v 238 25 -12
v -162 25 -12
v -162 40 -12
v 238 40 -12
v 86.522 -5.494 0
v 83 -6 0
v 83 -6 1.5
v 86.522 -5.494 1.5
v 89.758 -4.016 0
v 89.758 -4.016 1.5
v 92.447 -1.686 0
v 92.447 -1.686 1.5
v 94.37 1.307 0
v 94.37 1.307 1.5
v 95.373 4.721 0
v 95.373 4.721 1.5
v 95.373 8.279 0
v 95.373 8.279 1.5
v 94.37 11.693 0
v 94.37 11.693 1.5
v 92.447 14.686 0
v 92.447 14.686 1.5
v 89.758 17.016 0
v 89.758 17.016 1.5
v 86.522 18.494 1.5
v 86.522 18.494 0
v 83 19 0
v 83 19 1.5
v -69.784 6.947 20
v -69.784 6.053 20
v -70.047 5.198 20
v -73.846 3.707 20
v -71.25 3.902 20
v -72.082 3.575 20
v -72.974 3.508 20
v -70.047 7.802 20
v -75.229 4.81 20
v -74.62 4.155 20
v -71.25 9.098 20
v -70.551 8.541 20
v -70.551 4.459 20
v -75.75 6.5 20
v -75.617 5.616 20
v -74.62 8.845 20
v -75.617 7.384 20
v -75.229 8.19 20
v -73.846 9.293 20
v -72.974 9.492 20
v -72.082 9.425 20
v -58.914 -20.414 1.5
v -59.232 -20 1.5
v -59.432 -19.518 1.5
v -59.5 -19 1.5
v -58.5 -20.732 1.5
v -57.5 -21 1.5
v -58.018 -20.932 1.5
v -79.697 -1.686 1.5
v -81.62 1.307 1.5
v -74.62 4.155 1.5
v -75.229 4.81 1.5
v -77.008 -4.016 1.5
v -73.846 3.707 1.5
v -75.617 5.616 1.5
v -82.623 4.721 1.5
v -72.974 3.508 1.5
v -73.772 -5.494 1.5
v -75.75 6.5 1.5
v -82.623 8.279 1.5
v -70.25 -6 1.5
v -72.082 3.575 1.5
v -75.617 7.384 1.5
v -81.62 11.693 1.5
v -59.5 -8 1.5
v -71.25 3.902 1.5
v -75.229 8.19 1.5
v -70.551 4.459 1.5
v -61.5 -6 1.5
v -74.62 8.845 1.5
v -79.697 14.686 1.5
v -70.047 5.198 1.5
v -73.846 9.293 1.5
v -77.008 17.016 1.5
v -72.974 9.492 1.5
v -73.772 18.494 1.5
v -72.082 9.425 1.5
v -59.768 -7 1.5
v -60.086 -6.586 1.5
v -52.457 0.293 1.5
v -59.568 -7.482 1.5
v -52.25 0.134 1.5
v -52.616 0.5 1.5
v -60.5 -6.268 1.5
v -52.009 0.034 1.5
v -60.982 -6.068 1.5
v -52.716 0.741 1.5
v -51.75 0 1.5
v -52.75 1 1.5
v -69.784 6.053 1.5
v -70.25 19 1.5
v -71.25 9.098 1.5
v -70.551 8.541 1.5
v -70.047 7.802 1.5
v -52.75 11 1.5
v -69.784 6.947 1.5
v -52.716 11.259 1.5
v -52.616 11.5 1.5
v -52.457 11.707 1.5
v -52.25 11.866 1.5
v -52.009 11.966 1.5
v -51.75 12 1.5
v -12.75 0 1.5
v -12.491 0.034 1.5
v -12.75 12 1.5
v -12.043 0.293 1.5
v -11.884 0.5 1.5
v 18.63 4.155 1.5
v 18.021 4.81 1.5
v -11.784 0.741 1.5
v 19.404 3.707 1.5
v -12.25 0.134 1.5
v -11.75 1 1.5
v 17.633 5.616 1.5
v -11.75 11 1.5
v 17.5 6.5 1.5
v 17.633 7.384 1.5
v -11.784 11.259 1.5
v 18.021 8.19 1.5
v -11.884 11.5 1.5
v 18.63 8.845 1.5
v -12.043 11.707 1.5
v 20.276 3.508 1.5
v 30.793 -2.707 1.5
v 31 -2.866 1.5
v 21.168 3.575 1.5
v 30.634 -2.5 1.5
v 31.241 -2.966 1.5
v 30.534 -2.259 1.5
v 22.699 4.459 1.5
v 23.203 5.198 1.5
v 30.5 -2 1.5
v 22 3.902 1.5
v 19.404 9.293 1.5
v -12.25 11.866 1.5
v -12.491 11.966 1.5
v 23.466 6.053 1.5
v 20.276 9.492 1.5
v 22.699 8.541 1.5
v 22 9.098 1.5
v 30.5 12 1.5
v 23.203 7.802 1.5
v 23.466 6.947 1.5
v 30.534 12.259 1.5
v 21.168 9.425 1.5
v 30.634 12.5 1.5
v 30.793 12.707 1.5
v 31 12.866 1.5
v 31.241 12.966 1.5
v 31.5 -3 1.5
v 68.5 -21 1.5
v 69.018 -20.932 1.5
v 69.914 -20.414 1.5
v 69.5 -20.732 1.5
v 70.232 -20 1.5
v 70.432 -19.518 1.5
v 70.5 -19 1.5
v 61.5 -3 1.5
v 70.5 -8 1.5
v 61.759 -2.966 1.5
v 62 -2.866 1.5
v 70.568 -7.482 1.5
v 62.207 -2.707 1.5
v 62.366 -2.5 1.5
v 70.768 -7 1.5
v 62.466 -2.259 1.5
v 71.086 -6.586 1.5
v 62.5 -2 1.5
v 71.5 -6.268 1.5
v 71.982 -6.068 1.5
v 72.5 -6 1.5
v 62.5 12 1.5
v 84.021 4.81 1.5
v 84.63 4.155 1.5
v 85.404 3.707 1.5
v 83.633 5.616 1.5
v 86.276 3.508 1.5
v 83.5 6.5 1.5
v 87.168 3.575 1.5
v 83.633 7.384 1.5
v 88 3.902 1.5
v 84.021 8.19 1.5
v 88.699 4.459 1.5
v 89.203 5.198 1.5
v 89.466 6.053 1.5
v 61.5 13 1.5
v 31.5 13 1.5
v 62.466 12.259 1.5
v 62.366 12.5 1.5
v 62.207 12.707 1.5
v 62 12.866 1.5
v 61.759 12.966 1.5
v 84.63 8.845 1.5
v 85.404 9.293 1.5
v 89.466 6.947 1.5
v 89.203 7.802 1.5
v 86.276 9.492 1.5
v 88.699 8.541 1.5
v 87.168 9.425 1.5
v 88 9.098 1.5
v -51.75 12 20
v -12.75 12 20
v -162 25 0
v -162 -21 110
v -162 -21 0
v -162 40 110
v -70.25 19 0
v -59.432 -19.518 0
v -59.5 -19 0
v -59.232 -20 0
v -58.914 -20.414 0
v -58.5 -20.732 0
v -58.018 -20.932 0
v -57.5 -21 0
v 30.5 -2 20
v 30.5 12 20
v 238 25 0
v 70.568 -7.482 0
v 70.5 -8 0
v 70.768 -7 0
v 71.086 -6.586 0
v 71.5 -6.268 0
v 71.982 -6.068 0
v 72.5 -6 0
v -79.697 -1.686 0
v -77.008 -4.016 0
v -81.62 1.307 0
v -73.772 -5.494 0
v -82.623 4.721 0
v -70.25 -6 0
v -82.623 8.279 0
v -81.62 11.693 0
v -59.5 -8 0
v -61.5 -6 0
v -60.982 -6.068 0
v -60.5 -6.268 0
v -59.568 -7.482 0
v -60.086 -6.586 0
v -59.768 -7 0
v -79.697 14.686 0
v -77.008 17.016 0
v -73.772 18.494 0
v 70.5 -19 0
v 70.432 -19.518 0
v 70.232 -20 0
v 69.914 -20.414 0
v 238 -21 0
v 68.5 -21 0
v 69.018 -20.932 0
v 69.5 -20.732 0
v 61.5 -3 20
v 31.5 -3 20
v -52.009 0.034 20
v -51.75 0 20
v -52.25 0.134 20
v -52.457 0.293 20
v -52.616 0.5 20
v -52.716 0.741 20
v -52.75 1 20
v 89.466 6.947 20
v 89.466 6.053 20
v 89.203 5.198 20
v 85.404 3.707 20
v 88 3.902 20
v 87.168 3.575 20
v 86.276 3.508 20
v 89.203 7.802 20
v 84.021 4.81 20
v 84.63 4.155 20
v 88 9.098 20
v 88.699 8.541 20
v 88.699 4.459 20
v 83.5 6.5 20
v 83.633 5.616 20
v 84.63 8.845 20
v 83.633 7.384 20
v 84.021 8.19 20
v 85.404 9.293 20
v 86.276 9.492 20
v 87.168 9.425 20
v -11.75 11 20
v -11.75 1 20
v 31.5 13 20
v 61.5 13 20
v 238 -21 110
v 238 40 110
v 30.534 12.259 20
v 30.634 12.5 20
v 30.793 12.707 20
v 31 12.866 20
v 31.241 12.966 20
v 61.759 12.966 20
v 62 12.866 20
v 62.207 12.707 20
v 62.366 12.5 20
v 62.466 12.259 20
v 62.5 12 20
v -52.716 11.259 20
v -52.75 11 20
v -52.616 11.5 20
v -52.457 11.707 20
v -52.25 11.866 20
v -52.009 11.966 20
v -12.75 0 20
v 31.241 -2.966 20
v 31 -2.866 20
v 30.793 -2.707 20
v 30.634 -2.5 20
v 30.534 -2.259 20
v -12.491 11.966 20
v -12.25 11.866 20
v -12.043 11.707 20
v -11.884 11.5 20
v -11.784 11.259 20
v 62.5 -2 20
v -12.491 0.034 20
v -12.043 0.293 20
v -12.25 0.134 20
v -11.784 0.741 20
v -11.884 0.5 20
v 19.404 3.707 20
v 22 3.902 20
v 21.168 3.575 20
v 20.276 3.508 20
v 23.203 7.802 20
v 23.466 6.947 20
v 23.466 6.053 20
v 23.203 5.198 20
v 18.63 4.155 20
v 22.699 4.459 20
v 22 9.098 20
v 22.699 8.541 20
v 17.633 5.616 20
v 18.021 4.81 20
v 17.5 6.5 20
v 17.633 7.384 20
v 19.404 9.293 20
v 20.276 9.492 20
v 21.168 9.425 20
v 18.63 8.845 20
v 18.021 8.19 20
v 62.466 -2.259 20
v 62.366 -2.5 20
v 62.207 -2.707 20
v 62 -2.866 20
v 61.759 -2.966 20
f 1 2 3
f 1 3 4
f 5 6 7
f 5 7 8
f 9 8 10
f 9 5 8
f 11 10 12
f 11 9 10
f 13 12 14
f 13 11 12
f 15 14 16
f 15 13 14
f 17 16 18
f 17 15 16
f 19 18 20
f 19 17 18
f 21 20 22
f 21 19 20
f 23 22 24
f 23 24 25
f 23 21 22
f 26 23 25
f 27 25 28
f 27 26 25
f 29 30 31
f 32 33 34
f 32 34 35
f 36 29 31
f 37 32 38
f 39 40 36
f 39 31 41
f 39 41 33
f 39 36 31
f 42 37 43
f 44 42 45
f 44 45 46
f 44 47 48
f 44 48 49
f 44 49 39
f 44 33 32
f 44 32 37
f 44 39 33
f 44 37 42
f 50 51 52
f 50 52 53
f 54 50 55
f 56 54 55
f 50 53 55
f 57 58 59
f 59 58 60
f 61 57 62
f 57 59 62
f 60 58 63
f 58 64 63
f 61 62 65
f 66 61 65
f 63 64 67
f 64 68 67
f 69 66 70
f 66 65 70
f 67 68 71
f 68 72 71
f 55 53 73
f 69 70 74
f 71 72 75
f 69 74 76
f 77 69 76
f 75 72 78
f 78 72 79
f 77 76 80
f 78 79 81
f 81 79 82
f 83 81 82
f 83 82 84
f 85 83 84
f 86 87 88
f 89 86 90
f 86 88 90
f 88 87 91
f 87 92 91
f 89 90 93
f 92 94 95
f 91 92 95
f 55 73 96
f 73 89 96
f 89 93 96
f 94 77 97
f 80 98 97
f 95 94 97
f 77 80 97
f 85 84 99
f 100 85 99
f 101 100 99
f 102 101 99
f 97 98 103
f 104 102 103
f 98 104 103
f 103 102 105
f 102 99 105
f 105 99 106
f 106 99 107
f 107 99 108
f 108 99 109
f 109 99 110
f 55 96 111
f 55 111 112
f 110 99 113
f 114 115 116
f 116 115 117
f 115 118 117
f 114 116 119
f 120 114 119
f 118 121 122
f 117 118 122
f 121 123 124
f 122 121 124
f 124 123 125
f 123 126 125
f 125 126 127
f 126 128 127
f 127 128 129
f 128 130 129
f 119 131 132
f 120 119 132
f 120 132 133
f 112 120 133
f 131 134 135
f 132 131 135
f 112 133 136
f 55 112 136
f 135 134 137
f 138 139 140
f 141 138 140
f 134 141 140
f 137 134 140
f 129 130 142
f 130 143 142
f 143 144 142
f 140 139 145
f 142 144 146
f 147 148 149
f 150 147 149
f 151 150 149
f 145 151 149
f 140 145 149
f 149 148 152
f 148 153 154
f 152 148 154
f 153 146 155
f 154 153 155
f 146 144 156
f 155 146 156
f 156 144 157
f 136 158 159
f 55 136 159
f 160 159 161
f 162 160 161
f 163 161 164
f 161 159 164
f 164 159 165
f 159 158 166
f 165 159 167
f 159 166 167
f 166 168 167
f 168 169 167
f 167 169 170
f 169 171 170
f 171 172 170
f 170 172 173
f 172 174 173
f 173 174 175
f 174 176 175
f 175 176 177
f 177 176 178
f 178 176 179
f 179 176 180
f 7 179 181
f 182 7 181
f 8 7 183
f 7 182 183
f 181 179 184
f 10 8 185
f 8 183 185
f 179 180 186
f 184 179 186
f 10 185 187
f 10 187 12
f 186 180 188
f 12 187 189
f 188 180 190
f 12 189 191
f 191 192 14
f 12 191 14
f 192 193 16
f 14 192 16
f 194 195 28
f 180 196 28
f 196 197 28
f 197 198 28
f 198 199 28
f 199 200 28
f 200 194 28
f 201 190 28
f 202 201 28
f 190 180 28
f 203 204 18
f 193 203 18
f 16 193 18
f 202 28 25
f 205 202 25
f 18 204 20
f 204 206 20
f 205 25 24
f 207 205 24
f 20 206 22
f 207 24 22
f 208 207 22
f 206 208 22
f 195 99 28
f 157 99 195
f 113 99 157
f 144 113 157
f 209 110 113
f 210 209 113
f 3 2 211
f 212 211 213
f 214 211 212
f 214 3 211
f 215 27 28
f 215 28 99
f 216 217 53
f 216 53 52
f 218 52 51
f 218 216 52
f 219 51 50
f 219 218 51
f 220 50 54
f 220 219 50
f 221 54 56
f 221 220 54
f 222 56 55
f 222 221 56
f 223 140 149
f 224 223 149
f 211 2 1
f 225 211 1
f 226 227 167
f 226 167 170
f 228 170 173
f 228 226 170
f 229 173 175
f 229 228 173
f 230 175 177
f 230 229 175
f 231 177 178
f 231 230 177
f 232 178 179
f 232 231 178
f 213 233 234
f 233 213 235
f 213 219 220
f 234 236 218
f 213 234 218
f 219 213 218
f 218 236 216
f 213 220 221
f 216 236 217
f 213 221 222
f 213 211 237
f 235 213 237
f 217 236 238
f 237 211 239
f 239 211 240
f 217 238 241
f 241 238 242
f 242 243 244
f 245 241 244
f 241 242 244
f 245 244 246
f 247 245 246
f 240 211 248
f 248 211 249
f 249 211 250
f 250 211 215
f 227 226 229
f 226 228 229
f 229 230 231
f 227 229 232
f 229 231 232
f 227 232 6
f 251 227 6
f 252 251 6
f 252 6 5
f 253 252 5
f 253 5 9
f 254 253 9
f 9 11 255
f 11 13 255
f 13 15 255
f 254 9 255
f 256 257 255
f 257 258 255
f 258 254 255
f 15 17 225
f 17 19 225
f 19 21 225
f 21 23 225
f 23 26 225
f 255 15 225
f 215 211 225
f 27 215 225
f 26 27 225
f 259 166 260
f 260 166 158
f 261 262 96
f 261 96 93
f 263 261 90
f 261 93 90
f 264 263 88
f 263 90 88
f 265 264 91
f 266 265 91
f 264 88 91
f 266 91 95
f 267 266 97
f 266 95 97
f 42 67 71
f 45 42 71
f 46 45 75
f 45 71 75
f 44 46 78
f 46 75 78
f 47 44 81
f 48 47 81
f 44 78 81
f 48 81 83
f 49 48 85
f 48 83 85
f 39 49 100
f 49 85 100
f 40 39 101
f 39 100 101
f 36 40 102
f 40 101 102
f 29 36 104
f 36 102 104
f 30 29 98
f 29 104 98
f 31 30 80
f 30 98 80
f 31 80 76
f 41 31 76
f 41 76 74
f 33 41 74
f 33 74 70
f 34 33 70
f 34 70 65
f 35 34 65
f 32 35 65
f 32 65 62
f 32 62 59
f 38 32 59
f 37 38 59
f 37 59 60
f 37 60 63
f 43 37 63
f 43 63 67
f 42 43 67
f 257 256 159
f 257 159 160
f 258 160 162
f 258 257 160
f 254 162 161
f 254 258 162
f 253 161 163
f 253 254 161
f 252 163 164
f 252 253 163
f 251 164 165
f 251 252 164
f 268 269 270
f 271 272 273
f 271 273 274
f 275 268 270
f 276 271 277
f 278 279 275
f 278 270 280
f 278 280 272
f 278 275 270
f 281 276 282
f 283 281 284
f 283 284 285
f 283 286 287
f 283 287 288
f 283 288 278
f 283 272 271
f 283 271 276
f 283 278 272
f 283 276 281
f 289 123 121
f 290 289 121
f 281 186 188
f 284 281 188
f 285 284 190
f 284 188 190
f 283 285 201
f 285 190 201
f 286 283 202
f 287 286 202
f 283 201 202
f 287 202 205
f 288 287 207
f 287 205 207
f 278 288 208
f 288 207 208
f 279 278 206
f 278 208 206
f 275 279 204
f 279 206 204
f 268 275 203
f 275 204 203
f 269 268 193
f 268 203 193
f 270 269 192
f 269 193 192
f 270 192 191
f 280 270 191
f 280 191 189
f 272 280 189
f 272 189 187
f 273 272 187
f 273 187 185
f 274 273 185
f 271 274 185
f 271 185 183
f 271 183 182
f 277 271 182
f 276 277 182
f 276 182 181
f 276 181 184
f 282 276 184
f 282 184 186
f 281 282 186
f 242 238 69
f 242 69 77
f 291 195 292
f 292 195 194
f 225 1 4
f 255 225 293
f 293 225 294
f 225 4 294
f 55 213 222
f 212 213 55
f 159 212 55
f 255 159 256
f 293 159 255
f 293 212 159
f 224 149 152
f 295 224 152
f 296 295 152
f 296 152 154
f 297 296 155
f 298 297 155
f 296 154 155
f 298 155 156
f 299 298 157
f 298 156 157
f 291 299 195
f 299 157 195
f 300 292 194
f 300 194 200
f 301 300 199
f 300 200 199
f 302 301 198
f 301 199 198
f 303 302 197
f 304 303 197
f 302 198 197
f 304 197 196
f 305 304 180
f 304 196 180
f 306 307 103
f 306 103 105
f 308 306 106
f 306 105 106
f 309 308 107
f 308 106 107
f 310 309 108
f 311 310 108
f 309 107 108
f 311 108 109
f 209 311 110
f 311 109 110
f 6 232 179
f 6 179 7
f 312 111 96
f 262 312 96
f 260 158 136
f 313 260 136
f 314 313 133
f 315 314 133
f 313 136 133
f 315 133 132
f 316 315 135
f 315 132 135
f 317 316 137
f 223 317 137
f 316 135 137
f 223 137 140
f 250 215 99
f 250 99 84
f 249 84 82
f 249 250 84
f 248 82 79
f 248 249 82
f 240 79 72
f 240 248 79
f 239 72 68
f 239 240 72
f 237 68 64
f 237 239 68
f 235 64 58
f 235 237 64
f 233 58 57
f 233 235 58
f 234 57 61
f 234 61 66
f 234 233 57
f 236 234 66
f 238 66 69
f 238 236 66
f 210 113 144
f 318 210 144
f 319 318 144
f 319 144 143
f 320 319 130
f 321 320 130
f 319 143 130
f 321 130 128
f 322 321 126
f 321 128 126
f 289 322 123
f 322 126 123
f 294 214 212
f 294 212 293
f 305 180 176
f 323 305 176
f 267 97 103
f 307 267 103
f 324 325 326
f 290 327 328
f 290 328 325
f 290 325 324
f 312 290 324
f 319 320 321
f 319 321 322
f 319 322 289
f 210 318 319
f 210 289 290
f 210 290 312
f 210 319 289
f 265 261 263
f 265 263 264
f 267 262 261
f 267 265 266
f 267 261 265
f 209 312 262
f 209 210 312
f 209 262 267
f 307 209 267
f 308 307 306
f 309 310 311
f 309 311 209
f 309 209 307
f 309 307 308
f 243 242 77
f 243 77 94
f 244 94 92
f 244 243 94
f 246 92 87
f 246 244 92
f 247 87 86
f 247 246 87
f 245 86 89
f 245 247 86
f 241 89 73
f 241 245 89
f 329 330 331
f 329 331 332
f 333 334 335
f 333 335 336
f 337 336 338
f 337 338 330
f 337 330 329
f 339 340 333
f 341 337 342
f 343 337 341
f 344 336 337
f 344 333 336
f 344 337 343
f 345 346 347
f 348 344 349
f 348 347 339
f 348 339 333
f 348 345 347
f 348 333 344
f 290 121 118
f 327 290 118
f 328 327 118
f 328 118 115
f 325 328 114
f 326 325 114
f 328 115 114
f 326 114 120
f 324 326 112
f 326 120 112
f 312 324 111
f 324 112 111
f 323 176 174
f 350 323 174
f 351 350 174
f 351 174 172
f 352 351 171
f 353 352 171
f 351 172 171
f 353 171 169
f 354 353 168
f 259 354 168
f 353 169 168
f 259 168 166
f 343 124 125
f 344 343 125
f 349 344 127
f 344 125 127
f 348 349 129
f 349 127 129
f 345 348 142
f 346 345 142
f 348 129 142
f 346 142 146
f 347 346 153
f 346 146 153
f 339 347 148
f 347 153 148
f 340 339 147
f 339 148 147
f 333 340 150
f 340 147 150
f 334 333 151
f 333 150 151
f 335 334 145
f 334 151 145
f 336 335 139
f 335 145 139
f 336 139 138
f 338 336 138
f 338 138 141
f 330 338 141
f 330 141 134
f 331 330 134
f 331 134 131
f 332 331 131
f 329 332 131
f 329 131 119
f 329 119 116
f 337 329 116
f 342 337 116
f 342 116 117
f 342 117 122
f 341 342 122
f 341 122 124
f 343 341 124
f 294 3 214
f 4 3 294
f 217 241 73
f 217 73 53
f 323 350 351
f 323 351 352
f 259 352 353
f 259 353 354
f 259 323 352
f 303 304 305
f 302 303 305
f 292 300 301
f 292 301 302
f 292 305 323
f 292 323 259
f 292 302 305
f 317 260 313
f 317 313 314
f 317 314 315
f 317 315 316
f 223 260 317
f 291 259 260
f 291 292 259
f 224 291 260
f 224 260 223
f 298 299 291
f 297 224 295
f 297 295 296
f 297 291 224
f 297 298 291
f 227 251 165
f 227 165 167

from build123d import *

# Parameters (mm, degrees)
ESQUISSE3_W      = 400
ESQUISSE3_H      = 40
EXTRUSION1_DEPTH = 110
ESQUISSE8_W      = 400
ESQUISSE8_H      = 122
EXTRUSION3_DEPTH = 15
ESQUISSE11_W     = 400
ESQUISSE11_H     = 110
EXTRUSION5_DEPTH = 6
ESQUISSE10_R     = 3
EXTRUSION4_DEPTH = 1.5
ESQUISSE12_R     = 3
EXTRUSION6_DEPTH = 20


with BuildPart() as part:
    # Esquisse3 → Extrusion1 (new body)
    with BuildSketch(Plane.XY):
        with Locations((38, 5)):
            Rectangle(ESQUISSE3_W, ESQUISSE3_H)
    extrude(amount=EXTRUSION1_DEPTH)

    # Esquisse8 → Extrusion3 (add)
    with BuildSketch(Plane(origin=(0, 25, 0), x_dir=(1, 0, 0), z_dir=(0, 1, 0))):
        with Locations((38, -49)):
            Rectangle(ESQUISSE8_W, ESQUISSE8_H)
    extrude(amount=EXTRUSION3_DEPTH)

    # Esquisse11 → Extrusion5 (add)
    with BuildSketch(Plane.XZ.offset(15)):
        with Locations((38, 55)):
            Rectangle(ESQUISSE11_W, ESQUISSE11_H)
    extrude(amount=EXTRUSION5_DEPTH)

    # Esquisse10 → Extrusion4 (cut)
    with BuildSketch(Plane(origin=(0, 0, 0), x_dir=(-1, 0, 0), z_dir=(0, 0, -1))):
        with BuildLine():
            Line((59.5, -8), (59.5, -19))
            ThreePointArc((59.5, -19), (58.914213562, -20.414213562), (57.5, -21))
            Line((57.5, -21), (-68.5, -21))
            ThreePointArc((-68.5, -21), (-69.914213562, -20.414213562), (-70.5, -19))
            Line((-70.5, -19), (-70.5, -8))
            ThreePointArc((-70.5, -8), (-71.085786438, -6.585786438), (-72.5, -6))
            Line((-72.5, -6), (-83, -6))
            ThreePointArc((-83, -6), (-95.5, 6.5), (-83, 19))
            Line((-83, 19), (70.25, 19))
            ThreePointArc((70.25, 19), (82.75, 6.5), (70.25, -6))
            Line((70.25, -6), (61.5, -6))
            ThreePointArc((61.5, -6), (60.085786438, -6.585786438), (59.5, -8))
        make_face()
        with Locations((-86.5, 6.5)):
            Circle(ESQUISSE10_R, mode=Mode.SUBTRACT)
        with Locations((-20.5, 6.5)):
            Circle(ESQUISSE10_R, mode=Mode.SUBTRACT)
        with Locations((72.75, 6.5)):
            Circle(ESQUISSE10_R, mode=Mode.SUBTRACT)
        with BuildLine():
            Line((-31.5, -3), (-61.5, -3))
            ThreePointArc((-61.5, -3), (-62.207106781, -2.707106781), (-62.5, -2))
            Line((-62.5, -2), (-62.5, 12))
            ThreePointArc((-62.5, 12), (-62.207106781, 12.707106781), (-61.5, 13))
            Line((-61.5, 13), (-31.5, 13))
            ThreePointArc((-31.5, 13), (-30.792893219, 12.707106781), (-30.5, 12))
            Line((-30.5, 12), (-30.5, -2))
            ThreePointArc((-30.5, -2), (-30.792893219, -2.707106781), (-31.5, -3))
        make_face(mode=Mode.SUBTRACT)
        with BuildLine():
            Line((51.75, 0), (12.75, 0))
            ThreePointArc((12.75, 0), (12.042893219, 0.292893219), (11.75, 1))
            Line((11.75, 1), (11.75, 11))
            ThreePointArc((11.75, 11), (12.042893219, 11.707106781), (12.75, 12))
            Line((12.75, 12), (51.75, 12))
            ThreePointArc((51.75, 12), (52.457106781, 11.707106781), (52.75, 11))
            Line((52.75, 11), (52.75, 1))
            ThreePointArc((52.75, 1), (52.457106781, 0.292893219), (51.75, 0))
        make_face(mode=Mode.SUBTRACT)
    extrude(amount=-EXTRUSION4_DEPTH, mode=Mode.SUBTRACT)

    # Esquisse12 → Extrusion6 (cut)
    with BuildSketch(Plane(origin=(0, 0, 0), x_dir=(-1, 0, 0), z_dir=(0, 0, -1))):
        with Locations((-86.5, 6.5)):
            Circle(ESQUISSE12_R)
        with Locations((-20.5, 6.5)):
            Circle(ESQUISSE12_R)
        with Locations((72.75, 6.5)):
            Circle(ESQUISSE12_R)
        with BuildLine():
            Line((-30.5, -2), (-30.5, 12))
            ThreePointArc((-30.5, 12), (-30.792893219, 12.707106781), (-31.5, 13))
            Line((-31.5, 13), (-61.5, 13))
            ThreePointArc((-61.5, 13), (-62.207106781, 12.707106781), (-62.5, 12))
            Line((-62.5, 12), (-62.5, -2))
            ThreePointArc((-62.5, -2), (-62.207106781, -2.707106781), (-61.5, -3))
            Line((-61.5, -3), (-31.5, -3))
            ThreePointArc((-31.5, -3), (-30.792893219, -2.707106781), (-30.5, -2))
        make_face()
        with BuildLine():
            Line((52.75, 1), (52.75, 11))
            ThreePointArc((52.75, 11), (52.457106781, 11.707106781), (51.75, 12))
            Line((51.75, 12), (12.75, 12))
            ThreePointArc((12.75, 12), (12.042893219, 11.707106781), (11.75, 11))
            Line((11.75, 11), (11.75, 1))
            ThreePointArc((11.75, 1), (12.042893219, 0.292893219), (12.75, 0))
            Line((12.75, 0), (51.75, 0))
            ThreePointArc((51.75, 0), (52.457106781, 0.292893219), (52.75, 1))
        make_face()
    extrude(amount=-EXTRUSION6_DEPTH, mode=Mode.SUBTRACT)


solid = part.part
